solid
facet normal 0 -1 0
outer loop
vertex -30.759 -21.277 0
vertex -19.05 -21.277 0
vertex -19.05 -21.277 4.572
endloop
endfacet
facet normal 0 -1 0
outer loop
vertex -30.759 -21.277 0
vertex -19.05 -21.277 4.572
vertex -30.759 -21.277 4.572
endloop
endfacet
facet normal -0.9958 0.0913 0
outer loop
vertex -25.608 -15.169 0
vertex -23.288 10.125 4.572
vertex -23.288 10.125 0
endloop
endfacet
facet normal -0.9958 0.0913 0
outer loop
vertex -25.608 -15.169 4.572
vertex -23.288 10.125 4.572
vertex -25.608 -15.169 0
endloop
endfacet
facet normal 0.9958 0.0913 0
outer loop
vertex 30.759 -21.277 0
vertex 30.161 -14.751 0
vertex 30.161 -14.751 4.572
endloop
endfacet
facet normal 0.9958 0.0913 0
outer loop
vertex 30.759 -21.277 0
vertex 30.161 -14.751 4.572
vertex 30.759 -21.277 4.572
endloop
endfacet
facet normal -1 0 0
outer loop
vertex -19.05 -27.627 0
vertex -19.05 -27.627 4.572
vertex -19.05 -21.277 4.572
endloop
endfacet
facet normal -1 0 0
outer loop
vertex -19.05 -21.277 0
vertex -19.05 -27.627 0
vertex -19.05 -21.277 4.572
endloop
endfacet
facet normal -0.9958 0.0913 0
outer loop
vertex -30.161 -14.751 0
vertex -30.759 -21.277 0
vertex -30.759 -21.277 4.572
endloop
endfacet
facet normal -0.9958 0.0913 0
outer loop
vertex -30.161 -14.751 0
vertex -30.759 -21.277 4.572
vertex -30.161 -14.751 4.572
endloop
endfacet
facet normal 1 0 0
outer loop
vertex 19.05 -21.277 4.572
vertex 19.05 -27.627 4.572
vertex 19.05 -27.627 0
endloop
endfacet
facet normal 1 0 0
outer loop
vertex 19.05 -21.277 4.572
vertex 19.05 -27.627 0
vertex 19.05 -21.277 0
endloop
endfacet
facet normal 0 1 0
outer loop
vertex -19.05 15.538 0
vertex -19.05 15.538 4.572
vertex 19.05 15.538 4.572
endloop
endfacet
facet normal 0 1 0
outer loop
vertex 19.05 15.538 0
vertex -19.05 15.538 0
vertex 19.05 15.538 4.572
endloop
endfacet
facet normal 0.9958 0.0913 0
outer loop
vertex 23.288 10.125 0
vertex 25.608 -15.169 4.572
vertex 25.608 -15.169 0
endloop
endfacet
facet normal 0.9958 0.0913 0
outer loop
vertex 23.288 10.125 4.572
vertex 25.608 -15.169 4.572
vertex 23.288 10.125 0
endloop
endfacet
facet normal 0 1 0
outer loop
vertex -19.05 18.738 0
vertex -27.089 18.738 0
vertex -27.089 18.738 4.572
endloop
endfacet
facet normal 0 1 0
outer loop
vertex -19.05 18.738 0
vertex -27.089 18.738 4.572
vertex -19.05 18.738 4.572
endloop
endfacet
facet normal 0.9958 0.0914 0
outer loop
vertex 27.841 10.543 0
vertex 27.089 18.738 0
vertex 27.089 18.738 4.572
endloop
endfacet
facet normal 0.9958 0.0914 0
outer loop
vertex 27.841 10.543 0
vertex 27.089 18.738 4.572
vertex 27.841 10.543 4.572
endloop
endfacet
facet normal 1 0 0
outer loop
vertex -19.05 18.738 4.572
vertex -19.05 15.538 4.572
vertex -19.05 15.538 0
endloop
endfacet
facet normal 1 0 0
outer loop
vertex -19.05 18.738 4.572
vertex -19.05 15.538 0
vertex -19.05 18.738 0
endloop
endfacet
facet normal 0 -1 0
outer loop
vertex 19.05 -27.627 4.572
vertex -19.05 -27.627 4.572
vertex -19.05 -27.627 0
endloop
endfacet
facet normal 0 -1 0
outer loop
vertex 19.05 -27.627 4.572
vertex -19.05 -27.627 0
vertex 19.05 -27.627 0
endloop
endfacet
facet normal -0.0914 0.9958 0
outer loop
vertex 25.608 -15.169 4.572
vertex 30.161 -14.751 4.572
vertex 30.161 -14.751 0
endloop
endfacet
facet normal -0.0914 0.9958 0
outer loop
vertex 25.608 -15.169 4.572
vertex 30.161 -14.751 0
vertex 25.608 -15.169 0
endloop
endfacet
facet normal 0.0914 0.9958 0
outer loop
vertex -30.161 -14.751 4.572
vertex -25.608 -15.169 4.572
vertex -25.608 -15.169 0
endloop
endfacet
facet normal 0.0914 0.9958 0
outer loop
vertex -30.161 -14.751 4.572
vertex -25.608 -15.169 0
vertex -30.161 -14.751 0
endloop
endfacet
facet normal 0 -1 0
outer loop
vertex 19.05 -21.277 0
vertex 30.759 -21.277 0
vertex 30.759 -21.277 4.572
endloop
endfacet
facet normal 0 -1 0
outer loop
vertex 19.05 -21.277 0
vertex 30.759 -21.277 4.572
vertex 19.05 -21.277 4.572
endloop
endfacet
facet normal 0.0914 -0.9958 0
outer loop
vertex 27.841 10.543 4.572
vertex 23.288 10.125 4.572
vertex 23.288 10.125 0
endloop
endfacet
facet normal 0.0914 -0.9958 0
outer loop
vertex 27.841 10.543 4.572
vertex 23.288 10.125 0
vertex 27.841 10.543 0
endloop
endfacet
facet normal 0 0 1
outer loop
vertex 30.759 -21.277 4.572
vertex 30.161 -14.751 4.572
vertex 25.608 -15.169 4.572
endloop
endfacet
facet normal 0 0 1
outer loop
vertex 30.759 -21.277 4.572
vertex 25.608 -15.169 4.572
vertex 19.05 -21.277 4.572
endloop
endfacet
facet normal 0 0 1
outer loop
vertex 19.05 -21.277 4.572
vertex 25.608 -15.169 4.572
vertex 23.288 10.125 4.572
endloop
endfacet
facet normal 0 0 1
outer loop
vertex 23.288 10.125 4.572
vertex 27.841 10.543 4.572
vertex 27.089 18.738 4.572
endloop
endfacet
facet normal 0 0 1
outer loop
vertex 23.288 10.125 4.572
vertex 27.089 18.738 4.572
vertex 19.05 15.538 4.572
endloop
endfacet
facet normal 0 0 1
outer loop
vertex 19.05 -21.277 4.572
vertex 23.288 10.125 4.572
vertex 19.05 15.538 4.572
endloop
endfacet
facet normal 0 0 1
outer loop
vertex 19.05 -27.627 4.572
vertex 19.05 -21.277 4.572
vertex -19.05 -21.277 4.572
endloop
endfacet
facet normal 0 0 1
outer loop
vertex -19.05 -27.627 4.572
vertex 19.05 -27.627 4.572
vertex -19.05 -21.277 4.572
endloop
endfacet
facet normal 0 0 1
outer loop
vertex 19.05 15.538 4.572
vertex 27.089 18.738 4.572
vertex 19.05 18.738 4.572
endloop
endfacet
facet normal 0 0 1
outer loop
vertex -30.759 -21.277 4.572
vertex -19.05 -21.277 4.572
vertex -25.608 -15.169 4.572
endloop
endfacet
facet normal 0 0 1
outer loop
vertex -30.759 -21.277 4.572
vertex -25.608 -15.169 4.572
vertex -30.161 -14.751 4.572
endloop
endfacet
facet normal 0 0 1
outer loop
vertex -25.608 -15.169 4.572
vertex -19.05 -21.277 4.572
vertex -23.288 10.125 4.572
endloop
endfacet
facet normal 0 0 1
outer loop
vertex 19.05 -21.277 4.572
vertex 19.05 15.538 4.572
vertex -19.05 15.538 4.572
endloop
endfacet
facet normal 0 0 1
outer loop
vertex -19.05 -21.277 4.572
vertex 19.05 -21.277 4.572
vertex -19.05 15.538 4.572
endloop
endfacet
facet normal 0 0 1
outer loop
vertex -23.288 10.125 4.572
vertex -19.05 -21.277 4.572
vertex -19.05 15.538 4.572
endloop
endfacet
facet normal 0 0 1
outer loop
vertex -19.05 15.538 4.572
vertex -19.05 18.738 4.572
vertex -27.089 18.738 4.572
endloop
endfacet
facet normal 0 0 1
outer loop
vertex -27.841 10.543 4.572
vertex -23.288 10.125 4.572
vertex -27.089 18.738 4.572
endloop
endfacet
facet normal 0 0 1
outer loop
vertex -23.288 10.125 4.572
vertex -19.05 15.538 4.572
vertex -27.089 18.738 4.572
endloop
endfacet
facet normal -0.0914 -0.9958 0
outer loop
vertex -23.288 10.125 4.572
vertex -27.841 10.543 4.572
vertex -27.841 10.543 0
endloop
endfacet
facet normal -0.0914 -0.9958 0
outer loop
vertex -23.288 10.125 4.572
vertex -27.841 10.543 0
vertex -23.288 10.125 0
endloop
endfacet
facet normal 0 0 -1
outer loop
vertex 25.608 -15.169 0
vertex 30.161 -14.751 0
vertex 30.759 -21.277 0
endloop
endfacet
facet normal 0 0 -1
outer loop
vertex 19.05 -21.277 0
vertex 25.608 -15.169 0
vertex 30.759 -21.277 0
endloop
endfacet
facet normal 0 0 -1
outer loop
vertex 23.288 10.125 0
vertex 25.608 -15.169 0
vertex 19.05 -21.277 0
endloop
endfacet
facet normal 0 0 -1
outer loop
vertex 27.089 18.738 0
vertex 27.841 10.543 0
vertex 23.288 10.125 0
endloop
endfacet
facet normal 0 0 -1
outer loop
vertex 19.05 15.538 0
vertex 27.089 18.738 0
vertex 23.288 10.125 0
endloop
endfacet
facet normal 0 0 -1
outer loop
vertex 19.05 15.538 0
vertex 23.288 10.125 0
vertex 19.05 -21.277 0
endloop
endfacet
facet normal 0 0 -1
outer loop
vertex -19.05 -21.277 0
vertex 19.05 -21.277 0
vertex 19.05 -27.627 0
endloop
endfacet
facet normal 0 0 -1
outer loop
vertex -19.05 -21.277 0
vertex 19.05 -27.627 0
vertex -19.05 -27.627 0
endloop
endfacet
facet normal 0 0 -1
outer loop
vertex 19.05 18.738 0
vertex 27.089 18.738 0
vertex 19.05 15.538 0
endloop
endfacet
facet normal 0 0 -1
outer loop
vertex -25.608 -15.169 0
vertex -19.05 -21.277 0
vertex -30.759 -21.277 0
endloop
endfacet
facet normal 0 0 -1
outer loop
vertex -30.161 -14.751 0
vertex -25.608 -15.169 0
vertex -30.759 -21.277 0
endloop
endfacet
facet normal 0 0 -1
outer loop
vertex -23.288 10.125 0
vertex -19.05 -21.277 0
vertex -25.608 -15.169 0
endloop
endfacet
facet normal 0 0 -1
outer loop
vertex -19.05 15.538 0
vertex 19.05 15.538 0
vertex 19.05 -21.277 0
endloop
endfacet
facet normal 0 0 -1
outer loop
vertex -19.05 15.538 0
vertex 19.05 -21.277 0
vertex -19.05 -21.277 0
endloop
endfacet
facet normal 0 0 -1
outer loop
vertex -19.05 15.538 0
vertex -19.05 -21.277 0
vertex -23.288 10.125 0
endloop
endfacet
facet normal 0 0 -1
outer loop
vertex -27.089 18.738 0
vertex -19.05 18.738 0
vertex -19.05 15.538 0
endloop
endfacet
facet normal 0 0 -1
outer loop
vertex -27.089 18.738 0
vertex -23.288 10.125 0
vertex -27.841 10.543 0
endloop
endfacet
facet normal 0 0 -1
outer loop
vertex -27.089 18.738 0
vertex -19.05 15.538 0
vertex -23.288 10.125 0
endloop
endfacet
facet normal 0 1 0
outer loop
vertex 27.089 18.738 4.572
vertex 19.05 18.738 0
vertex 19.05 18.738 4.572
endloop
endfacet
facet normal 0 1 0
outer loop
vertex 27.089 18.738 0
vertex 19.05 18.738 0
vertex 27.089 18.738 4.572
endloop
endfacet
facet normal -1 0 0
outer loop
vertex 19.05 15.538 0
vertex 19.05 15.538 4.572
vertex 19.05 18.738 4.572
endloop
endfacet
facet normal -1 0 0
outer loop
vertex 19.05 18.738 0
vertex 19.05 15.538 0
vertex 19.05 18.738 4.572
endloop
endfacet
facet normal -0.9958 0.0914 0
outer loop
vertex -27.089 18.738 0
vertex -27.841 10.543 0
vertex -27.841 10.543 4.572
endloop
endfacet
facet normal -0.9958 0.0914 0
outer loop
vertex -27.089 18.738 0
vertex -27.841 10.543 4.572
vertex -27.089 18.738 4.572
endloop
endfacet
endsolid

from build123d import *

# Parameters (mm, degrees)
BOSS_EXTRUDE1_DEPTH = 4.572
SKETCH2_W           = 38.1
SKETCH2_H           = 3.2004
CUT_EXTRUDE1_DEPTH  = 5.572
SKETCH3_W           = 38.1
SKETCH3_H           = 6.35
BOSS_EXTRUDE2_DEPTH = 4.572


with BuildPart() as part:
    # Sketch1 → Boss-Extrude1 (new body)
    with BuildSketch(Plane.XY):
        Polygon((-27.0891, 18.738007515), (27.0891, 18.738007515), (30.7594, -21.276818659), (-30.7594, -21.276818659), align=None)
    extrude(amount=BOSS_EXTRUDE1_DEPTH)

    # Sketch2 → Cut-Extrude1 (cut, through all)
    with BuildSketch(Plane.XY.offset(4.572)):
        with Locations((0, 17.137807515)):
            Rectangle(SKETCH2_W, SKETCH2_H)
        Polygon((-30.160830215, -14.751012621), (-27.840792288, 10.542809234), (-23.287904354, 10.125202407), (-25.607942281, -15.168619448), align=None)
        Polygon((27.840792288, 10.542809234), (30.160830215, -14.751012621), (25.607942281, -15.168619448), (23.287904354, 10.125202407), align=None)
    extrude(amount=-CUT_EXTRUDE1_DEPTH, mode=Mode.SUBTRACT)

    # Sketch3 → Boss-Extrude2 (add)
    with BuildSketch(Plane.XY.offset(4.572)):
        with Locations((0, -24.451818659)):
            Rectangle(SKETCH3_W, SKETCH3_H)
    extrude(amount=-BOSS_EXTRUDE2_DEPTH)


solid = part.part
